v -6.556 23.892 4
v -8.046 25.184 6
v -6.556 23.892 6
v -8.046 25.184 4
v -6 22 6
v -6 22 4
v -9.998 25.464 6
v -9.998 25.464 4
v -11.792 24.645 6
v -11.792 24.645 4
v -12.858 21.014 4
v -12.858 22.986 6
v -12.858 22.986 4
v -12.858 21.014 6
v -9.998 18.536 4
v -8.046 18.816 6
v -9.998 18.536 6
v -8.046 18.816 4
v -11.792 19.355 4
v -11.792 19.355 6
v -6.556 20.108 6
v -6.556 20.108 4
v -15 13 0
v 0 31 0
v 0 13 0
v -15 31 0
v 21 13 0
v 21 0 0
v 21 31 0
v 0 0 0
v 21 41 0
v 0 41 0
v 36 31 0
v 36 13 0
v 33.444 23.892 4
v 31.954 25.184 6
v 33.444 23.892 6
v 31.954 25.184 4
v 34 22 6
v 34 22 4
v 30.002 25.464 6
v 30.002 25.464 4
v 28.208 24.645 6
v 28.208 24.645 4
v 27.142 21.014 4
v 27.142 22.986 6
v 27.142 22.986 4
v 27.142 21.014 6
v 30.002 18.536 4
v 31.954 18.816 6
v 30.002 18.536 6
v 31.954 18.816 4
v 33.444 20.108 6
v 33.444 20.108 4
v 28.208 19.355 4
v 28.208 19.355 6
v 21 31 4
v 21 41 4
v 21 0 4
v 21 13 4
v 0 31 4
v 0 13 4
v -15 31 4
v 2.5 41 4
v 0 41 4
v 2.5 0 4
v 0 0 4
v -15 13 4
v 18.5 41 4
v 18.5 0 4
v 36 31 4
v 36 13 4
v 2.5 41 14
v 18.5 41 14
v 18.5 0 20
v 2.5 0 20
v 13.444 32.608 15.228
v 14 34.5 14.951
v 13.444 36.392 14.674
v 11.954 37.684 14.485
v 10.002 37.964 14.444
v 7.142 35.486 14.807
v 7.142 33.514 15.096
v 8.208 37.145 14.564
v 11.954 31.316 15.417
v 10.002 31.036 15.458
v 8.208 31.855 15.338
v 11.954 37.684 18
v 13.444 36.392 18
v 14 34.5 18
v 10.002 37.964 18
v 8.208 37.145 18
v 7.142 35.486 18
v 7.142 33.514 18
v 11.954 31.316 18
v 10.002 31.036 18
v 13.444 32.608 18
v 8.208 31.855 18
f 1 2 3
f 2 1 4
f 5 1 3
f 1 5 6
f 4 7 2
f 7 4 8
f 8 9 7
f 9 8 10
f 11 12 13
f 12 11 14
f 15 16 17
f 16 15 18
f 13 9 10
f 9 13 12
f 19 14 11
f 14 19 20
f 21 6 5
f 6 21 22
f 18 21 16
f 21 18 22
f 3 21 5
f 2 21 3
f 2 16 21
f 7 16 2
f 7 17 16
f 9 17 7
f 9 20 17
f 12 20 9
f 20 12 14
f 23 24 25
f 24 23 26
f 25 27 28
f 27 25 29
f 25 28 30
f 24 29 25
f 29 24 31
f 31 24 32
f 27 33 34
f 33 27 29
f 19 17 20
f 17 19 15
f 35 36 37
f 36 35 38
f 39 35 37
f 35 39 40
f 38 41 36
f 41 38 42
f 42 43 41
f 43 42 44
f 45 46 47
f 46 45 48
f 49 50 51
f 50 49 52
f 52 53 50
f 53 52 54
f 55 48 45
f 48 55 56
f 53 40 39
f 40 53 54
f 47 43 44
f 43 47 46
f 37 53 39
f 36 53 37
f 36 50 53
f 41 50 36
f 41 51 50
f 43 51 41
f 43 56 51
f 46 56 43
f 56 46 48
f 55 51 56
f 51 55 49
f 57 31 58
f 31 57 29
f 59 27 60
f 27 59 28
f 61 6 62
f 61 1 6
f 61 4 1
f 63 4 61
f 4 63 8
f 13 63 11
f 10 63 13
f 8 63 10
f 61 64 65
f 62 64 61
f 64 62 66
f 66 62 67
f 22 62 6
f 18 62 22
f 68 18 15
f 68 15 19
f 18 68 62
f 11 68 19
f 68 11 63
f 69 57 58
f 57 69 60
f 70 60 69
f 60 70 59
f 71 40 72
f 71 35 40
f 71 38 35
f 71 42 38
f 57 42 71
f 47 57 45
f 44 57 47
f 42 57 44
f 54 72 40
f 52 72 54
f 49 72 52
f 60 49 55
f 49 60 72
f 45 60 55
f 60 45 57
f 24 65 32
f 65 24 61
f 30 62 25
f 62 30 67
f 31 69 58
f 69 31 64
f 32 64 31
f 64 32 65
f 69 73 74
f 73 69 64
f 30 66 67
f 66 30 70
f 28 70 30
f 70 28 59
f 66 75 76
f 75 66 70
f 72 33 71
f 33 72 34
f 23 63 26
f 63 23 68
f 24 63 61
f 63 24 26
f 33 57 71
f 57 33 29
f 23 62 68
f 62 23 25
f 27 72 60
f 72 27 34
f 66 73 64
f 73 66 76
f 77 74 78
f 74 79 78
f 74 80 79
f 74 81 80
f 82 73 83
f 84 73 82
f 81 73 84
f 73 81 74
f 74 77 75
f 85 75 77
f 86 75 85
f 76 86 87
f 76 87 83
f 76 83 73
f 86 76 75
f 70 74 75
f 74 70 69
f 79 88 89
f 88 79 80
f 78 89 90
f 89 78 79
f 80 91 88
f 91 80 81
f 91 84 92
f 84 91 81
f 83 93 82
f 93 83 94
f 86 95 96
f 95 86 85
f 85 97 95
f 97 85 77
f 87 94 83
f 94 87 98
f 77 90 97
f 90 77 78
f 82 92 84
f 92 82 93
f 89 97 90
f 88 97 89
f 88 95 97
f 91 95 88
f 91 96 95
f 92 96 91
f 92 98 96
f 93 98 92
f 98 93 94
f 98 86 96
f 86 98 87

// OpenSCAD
module closet_hinge()
{
  // lower cross
  cube([21, 41, 4]);
  translate([-51/2 + 21/2, 41-18-10])
    cube([51, 18, 4]);
  // hinge upper part
  translate([(21-16)/2, 0, 4])
  {
    polyhedron(
      points = [
               [ 0,  0,  0], // 0
               [16,  0,  0], // 1
               [ 0,  0, 16], // 2
               [16,  0, 16], // 3
               [ 0, 41,  0], // 4
               [16, 41,  0], // 5
               [ 0, 41, 10], // 6
               [16, 41, 10]  // 7
             ], 
      faces = [
               [0,2,1],
               [1,2,3],
               [1,3,7],
               [7,5,1],
               [6,2,0],
               [0,4,6],
               [4,5,6],
               [7,6,5],
               [6,3,2],
               [3,6,7],
               [0,1,4],
               [5,4,1]
            ]
    );
  }
  // side mounting screws
  translate([0, 41-10-18/2, 0])
  {
    for(offsetOX = [-19/2, 21+19/2])
      translate([offsetOX, 0, 0])
        cylinder(r=7/2, h=6, $fs=2);
  }
  // main positioning screw
  translate([21/2, 41-3-7/2, 0])
    cylinder(r=7/2, h=18, $fs=2);
}

closet_hinge();
